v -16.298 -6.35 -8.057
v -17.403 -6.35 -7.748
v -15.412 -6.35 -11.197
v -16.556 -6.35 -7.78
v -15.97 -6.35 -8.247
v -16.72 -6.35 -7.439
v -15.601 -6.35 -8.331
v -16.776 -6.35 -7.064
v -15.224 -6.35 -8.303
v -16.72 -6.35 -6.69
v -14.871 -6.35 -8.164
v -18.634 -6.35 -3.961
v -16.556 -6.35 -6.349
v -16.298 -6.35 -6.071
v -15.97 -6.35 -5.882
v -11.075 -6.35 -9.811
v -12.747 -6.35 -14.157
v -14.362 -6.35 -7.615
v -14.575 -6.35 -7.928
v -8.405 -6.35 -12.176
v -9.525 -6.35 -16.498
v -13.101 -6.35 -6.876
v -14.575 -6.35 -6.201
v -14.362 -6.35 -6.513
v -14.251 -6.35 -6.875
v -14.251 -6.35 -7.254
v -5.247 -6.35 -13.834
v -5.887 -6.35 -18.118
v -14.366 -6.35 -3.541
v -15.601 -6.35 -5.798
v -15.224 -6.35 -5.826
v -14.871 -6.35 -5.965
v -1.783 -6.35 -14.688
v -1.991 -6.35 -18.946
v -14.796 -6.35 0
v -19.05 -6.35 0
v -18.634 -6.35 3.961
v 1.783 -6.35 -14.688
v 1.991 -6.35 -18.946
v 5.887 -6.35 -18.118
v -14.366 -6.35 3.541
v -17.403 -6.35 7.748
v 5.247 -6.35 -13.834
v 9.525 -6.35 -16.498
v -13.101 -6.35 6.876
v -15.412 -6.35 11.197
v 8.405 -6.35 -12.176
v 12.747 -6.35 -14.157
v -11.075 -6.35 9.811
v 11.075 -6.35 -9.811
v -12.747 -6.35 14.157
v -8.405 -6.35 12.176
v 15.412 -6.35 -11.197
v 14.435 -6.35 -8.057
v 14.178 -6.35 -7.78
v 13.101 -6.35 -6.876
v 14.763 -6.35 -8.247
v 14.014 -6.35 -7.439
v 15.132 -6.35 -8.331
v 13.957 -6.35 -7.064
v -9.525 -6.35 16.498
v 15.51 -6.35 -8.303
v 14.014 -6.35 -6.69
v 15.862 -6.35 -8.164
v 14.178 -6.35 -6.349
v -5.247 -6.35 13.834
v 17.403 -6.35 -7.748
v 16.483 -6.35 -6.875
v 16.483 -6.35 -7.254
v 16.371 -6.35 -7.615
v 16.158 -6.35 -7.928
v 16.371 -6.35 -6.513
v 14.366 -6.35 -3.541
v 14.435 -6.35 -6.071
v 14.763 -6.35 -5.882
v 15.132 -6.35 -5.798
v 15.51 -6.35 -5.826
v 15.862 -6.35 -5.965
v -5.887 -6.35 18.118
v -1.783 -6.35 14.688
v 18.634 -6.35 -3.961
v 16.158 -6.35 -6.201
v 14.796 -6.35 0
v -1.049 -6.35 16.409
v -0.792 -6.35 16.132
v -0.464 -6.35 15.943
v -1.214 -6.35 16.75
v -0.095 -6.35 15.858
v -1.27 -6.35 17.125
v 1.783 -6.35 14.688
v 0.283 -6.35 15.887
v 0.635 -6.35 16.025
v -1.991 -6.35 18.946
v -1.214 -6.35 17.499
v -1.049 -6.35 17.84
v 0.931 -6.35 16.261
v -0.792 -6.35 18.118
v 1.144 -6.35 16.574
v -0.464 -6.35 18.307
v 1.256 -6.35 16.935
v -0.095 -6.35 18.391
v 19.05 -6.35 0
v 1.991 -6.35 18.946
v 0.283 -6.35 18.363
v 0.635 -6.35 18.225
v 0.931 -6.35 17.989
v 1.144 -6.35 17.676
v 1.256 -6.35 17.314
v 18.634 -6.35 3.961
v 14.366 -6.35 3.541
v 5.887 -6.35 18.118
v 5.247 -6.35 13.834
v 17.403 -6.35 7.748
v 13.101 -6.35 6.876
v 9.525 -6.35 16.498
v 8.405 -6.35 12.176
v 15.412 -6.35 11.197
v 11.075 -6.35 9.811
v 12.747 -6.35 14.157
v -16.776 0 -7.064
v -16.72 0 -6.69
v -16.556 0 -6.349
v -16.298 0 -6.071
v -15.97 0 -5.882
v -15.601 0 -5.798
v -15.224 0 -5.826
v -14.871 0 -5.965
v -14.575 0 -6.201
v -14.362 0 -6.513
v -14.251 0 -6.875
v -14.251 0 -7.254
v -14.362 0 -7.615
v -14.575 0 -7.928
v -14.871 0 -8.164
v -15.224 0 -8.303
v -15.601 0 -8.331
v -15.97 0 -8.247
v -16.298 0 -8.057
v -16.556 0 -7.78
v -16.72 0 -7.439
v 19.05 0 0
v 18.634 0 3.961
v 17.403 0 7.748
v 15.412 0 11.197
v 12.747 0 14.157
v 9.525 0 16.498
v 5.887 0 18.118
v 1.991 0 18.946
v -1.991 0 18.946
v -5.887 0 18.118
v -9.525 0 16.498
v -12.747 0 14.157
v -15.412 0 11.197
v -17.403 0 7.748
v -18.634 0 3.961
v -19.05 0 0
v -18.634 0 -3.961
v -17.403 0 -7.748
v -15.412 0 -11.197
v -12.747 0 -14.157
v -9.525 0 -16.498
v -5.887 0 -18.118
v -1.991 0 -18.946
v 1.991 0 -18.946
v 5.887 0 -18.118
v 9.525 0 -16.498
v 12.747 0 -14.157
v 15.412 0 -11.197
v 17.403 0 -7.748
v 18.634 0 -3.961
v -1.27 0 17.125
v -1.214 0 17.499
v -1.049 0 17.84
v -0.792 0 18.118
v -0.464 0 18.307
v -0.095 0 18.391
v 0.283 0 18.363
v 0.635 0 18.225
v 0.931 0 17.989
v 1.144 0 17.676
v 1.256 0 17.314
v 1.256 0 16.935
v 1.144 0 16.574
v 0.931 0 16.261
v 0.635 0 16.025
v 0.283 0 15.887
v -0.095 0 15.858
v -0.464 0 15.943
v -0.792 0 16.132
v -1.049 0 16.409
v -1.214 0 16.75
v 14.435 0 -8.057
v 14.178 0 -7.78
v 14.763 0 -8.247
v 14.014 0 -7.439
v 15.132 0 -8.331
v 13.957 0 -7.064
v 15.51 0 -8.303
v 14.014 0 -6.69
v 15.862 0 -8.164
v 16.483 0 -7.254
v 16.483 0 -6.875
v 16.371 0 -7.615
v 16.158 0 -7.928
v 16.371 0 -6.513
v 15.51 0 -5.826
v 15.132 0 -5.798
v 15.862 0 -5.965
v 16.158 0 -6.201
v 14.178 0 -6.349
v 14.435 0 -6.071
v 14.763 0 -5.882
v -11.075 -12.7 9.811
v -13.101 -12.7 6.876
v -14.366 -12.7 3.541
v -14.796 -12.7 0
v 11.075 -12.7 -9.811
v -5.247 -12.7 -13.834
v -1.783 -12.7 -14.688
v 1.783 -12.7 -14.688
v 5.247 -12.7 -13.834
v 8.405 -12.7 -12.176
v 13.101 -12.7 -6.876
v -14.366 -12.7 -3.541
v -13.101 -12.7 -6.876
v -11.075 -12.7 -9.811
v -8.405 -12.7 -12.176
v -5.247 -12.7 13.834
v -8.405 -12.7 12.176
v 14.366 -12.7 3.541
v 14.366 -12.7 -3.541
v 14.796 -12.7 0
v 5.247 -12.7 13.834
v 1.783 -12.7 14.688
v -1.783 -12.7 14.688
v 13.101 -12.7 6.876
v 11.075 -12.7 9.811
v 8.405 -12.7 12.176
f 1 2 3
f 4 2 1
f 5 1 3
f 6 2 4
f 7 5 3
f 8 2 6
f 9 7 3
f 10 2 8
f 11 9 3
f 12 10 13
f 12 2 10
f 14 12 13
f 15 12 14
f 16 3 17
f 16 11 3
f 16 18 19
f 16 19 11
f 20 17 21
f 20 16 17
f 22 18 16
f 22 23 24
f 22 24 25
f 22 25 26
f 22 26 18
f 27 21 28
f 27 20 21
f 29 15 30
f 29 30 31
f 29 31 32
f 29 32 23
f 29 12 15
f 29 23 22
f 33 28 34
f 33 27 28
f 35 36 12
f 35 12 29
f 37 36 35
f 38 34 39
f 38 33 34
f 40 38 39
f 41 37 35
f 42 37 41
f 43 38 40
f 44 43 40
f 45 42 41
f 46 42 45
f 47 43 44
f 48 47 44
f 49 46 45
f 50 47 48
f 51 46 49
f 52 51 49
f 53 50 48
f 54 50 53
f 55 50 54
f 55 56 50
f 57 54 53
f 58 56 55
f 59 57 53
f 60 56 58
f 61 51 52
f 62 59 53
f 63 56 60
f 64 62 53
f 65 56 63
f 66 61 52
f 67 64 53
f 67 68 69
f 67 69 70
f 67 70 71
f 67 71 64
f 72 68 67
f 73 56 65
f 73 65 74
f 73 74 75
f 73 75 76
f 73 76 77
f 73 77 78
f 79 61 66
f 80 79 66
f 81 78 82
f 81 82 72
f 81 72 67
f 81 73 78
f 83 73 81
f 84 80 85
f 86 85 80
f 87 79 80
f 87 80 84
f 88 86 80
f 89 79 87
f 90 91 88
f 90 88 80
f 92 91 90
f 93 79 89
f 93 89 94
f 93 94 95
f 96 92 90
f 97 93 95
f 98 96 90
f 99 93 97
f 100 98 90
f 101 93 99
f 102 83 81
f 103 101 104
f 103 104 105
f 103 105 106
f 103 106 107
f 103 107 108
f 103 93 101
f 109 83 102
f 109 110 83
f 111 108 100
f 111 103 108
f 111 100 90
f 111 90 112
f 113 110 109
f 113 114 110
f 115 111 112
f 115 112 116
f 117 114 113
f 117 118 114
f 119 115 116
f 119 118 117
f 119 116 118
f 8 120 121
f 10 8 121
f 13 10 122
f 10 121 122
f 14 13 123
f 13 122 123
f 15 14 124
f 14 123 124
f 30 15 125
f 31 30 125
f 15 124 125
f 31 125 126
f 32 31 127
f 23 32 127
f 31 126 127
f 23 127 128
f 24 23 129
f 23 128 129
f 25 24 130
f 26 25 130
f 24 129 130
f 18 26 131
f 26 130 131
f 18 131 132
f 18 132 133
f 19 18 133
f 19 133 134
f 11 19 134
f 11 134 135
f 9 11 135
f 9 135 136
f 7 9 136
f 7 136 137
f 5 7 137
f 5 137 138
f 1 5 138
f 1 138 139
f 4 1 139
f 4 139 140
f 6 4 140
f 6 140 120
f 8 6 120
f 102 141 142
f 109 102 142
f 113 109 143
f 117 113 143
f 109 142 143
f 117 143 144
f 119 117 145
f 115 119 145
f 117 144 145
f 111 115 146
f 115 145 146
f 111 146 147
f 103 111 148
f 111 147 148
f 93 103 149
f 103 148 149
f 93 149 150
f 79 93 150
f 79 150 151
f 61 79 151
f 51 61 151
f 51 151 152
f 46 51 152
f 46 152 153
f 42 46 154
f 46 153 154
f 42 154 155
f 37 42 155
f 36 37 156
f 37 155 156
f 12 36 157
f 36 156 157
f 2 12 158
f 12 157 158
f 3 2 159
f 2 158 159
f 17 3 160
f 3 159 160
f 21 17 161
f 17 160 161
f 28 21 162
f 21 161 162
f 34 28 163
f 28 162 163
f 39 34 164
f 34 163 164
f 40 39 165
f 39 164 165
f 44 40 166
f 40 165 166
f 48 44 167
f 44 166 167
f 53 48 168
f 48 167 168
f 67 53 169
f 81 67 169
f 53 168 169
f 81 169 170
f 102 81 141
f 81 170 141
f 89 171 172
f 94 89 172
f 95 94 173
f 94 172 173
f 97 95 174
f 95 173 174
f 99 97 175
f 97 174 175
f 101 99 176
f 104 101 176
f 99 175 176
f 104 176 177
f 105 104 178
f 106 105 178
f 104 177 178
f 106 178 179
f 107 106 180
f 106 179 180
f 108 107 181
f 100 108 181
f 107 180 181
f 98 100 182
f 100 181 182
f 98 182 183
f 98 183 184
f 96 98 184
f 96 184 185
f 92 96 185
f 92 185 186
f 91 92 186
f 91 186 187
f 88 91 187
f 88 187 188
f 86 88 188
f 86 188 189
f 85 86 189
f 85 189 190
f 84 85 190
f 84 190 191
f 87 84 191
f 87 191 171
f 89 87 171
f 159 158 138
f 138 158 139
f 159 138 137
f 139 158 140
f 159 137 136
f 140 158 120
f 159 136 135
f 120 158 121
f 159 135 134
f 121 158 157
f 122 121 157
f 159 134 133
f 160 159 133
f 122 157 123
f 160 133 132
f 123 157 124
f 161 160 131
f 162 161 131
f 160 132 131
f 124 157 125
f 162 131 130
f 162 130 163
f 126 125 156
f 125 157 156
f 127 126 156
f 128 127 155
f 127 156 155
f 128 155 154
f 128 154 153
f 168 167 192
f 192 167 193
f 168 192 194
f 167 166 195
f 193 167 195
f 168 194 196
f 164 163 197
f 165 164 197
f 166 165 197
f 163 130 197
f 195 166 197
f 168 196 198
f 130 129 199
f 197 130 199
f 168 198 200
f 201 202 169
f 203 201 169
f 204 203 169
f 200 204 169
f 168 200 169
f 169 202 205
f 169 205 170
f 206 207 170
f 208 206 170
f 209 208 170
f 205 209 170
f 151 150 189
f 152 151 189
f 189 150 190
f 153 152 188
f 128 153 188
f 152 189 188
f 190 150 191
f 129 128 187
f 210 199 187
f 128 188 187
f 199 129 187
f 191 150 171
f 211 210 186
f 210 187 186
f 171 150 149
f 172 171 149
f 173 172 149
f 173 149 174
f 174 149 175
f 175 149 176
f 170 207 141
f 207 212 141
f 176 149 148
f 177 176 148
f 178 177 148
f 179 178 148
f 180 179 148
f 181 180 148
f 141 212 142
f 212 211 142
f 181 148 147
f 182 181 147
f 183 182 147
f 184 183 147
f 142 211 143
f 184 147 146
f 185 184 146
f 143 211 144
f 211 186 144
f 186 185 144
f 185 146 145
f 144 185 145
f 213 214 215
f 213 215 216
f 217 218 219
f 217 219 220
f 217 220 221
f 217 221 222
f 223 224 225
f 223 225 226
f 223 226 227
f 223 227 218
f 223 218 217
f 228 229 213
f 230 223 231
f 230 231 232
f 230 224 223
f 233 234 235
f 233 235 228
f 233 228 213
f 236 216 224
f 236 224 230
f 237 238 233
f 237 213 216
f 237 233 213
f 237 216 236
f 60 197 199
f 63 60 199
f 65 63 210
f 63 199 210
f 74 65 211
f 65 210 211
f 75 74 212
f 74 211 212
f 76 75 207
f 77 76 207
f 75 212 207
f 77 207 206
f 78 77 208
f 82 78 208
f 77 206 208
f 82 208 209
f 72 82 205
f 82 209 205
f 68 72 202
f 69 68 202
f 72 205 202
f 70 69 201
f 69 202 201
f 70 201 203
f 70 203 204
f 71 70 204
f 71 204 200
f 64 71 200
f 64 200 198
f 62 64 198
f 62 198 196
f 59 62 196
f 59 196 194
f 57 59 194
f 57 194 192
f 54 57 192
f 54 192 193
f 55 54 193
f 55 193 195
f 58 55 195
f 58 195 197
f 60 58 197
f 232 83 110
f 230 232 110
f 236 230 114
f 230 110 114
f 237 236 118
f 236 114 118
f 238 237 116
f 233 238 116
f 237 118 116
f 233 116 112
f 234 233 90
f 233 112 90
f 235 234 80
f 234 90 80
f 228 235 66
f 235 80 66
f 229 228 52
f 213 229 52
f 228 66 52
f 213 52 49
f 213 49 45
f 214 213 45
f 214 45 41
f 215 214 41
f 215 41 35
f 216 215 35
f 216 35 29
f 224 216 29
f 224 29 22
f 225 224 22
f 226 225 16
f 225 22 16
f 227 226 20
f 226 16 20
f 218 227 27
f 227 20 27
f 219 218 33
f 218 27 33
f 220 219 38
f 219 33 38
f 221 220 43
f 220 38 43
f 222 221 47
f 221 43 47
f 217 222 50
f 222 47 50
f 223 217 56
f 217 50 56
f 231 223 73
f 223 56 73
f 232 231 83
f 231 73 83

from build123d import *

# Parameters (mm, degrees)
F0_R     = 19.05
F1_DEPTH = 6.35
F3_R     = 14.7955
F4_DEPTH = 6.35
F6_D     = 2.54


with BuildPart() as f1:
    # F0 (on Front) → F1 (new body)
    with BuildSketch(Plane.XZ):
        Circle(F0_R)
    extrude(amount=F1_DEPTH)

    # F3 (on offset) → F4 (join)
    with BuildSketch(Plane.XZ.offset(6.35)):
        Circle(F3_R)
    extrude(amount=F4_DEPTH)

    # F6 (through all)
    with Locations(Plane.XZ.offset(6.35)):
        with Locations((0, 17.124727), (15.2271, -7.064389), (-15.506332, -7.064389)):
            Hole(F6_D / 2)


solid = f1.part
